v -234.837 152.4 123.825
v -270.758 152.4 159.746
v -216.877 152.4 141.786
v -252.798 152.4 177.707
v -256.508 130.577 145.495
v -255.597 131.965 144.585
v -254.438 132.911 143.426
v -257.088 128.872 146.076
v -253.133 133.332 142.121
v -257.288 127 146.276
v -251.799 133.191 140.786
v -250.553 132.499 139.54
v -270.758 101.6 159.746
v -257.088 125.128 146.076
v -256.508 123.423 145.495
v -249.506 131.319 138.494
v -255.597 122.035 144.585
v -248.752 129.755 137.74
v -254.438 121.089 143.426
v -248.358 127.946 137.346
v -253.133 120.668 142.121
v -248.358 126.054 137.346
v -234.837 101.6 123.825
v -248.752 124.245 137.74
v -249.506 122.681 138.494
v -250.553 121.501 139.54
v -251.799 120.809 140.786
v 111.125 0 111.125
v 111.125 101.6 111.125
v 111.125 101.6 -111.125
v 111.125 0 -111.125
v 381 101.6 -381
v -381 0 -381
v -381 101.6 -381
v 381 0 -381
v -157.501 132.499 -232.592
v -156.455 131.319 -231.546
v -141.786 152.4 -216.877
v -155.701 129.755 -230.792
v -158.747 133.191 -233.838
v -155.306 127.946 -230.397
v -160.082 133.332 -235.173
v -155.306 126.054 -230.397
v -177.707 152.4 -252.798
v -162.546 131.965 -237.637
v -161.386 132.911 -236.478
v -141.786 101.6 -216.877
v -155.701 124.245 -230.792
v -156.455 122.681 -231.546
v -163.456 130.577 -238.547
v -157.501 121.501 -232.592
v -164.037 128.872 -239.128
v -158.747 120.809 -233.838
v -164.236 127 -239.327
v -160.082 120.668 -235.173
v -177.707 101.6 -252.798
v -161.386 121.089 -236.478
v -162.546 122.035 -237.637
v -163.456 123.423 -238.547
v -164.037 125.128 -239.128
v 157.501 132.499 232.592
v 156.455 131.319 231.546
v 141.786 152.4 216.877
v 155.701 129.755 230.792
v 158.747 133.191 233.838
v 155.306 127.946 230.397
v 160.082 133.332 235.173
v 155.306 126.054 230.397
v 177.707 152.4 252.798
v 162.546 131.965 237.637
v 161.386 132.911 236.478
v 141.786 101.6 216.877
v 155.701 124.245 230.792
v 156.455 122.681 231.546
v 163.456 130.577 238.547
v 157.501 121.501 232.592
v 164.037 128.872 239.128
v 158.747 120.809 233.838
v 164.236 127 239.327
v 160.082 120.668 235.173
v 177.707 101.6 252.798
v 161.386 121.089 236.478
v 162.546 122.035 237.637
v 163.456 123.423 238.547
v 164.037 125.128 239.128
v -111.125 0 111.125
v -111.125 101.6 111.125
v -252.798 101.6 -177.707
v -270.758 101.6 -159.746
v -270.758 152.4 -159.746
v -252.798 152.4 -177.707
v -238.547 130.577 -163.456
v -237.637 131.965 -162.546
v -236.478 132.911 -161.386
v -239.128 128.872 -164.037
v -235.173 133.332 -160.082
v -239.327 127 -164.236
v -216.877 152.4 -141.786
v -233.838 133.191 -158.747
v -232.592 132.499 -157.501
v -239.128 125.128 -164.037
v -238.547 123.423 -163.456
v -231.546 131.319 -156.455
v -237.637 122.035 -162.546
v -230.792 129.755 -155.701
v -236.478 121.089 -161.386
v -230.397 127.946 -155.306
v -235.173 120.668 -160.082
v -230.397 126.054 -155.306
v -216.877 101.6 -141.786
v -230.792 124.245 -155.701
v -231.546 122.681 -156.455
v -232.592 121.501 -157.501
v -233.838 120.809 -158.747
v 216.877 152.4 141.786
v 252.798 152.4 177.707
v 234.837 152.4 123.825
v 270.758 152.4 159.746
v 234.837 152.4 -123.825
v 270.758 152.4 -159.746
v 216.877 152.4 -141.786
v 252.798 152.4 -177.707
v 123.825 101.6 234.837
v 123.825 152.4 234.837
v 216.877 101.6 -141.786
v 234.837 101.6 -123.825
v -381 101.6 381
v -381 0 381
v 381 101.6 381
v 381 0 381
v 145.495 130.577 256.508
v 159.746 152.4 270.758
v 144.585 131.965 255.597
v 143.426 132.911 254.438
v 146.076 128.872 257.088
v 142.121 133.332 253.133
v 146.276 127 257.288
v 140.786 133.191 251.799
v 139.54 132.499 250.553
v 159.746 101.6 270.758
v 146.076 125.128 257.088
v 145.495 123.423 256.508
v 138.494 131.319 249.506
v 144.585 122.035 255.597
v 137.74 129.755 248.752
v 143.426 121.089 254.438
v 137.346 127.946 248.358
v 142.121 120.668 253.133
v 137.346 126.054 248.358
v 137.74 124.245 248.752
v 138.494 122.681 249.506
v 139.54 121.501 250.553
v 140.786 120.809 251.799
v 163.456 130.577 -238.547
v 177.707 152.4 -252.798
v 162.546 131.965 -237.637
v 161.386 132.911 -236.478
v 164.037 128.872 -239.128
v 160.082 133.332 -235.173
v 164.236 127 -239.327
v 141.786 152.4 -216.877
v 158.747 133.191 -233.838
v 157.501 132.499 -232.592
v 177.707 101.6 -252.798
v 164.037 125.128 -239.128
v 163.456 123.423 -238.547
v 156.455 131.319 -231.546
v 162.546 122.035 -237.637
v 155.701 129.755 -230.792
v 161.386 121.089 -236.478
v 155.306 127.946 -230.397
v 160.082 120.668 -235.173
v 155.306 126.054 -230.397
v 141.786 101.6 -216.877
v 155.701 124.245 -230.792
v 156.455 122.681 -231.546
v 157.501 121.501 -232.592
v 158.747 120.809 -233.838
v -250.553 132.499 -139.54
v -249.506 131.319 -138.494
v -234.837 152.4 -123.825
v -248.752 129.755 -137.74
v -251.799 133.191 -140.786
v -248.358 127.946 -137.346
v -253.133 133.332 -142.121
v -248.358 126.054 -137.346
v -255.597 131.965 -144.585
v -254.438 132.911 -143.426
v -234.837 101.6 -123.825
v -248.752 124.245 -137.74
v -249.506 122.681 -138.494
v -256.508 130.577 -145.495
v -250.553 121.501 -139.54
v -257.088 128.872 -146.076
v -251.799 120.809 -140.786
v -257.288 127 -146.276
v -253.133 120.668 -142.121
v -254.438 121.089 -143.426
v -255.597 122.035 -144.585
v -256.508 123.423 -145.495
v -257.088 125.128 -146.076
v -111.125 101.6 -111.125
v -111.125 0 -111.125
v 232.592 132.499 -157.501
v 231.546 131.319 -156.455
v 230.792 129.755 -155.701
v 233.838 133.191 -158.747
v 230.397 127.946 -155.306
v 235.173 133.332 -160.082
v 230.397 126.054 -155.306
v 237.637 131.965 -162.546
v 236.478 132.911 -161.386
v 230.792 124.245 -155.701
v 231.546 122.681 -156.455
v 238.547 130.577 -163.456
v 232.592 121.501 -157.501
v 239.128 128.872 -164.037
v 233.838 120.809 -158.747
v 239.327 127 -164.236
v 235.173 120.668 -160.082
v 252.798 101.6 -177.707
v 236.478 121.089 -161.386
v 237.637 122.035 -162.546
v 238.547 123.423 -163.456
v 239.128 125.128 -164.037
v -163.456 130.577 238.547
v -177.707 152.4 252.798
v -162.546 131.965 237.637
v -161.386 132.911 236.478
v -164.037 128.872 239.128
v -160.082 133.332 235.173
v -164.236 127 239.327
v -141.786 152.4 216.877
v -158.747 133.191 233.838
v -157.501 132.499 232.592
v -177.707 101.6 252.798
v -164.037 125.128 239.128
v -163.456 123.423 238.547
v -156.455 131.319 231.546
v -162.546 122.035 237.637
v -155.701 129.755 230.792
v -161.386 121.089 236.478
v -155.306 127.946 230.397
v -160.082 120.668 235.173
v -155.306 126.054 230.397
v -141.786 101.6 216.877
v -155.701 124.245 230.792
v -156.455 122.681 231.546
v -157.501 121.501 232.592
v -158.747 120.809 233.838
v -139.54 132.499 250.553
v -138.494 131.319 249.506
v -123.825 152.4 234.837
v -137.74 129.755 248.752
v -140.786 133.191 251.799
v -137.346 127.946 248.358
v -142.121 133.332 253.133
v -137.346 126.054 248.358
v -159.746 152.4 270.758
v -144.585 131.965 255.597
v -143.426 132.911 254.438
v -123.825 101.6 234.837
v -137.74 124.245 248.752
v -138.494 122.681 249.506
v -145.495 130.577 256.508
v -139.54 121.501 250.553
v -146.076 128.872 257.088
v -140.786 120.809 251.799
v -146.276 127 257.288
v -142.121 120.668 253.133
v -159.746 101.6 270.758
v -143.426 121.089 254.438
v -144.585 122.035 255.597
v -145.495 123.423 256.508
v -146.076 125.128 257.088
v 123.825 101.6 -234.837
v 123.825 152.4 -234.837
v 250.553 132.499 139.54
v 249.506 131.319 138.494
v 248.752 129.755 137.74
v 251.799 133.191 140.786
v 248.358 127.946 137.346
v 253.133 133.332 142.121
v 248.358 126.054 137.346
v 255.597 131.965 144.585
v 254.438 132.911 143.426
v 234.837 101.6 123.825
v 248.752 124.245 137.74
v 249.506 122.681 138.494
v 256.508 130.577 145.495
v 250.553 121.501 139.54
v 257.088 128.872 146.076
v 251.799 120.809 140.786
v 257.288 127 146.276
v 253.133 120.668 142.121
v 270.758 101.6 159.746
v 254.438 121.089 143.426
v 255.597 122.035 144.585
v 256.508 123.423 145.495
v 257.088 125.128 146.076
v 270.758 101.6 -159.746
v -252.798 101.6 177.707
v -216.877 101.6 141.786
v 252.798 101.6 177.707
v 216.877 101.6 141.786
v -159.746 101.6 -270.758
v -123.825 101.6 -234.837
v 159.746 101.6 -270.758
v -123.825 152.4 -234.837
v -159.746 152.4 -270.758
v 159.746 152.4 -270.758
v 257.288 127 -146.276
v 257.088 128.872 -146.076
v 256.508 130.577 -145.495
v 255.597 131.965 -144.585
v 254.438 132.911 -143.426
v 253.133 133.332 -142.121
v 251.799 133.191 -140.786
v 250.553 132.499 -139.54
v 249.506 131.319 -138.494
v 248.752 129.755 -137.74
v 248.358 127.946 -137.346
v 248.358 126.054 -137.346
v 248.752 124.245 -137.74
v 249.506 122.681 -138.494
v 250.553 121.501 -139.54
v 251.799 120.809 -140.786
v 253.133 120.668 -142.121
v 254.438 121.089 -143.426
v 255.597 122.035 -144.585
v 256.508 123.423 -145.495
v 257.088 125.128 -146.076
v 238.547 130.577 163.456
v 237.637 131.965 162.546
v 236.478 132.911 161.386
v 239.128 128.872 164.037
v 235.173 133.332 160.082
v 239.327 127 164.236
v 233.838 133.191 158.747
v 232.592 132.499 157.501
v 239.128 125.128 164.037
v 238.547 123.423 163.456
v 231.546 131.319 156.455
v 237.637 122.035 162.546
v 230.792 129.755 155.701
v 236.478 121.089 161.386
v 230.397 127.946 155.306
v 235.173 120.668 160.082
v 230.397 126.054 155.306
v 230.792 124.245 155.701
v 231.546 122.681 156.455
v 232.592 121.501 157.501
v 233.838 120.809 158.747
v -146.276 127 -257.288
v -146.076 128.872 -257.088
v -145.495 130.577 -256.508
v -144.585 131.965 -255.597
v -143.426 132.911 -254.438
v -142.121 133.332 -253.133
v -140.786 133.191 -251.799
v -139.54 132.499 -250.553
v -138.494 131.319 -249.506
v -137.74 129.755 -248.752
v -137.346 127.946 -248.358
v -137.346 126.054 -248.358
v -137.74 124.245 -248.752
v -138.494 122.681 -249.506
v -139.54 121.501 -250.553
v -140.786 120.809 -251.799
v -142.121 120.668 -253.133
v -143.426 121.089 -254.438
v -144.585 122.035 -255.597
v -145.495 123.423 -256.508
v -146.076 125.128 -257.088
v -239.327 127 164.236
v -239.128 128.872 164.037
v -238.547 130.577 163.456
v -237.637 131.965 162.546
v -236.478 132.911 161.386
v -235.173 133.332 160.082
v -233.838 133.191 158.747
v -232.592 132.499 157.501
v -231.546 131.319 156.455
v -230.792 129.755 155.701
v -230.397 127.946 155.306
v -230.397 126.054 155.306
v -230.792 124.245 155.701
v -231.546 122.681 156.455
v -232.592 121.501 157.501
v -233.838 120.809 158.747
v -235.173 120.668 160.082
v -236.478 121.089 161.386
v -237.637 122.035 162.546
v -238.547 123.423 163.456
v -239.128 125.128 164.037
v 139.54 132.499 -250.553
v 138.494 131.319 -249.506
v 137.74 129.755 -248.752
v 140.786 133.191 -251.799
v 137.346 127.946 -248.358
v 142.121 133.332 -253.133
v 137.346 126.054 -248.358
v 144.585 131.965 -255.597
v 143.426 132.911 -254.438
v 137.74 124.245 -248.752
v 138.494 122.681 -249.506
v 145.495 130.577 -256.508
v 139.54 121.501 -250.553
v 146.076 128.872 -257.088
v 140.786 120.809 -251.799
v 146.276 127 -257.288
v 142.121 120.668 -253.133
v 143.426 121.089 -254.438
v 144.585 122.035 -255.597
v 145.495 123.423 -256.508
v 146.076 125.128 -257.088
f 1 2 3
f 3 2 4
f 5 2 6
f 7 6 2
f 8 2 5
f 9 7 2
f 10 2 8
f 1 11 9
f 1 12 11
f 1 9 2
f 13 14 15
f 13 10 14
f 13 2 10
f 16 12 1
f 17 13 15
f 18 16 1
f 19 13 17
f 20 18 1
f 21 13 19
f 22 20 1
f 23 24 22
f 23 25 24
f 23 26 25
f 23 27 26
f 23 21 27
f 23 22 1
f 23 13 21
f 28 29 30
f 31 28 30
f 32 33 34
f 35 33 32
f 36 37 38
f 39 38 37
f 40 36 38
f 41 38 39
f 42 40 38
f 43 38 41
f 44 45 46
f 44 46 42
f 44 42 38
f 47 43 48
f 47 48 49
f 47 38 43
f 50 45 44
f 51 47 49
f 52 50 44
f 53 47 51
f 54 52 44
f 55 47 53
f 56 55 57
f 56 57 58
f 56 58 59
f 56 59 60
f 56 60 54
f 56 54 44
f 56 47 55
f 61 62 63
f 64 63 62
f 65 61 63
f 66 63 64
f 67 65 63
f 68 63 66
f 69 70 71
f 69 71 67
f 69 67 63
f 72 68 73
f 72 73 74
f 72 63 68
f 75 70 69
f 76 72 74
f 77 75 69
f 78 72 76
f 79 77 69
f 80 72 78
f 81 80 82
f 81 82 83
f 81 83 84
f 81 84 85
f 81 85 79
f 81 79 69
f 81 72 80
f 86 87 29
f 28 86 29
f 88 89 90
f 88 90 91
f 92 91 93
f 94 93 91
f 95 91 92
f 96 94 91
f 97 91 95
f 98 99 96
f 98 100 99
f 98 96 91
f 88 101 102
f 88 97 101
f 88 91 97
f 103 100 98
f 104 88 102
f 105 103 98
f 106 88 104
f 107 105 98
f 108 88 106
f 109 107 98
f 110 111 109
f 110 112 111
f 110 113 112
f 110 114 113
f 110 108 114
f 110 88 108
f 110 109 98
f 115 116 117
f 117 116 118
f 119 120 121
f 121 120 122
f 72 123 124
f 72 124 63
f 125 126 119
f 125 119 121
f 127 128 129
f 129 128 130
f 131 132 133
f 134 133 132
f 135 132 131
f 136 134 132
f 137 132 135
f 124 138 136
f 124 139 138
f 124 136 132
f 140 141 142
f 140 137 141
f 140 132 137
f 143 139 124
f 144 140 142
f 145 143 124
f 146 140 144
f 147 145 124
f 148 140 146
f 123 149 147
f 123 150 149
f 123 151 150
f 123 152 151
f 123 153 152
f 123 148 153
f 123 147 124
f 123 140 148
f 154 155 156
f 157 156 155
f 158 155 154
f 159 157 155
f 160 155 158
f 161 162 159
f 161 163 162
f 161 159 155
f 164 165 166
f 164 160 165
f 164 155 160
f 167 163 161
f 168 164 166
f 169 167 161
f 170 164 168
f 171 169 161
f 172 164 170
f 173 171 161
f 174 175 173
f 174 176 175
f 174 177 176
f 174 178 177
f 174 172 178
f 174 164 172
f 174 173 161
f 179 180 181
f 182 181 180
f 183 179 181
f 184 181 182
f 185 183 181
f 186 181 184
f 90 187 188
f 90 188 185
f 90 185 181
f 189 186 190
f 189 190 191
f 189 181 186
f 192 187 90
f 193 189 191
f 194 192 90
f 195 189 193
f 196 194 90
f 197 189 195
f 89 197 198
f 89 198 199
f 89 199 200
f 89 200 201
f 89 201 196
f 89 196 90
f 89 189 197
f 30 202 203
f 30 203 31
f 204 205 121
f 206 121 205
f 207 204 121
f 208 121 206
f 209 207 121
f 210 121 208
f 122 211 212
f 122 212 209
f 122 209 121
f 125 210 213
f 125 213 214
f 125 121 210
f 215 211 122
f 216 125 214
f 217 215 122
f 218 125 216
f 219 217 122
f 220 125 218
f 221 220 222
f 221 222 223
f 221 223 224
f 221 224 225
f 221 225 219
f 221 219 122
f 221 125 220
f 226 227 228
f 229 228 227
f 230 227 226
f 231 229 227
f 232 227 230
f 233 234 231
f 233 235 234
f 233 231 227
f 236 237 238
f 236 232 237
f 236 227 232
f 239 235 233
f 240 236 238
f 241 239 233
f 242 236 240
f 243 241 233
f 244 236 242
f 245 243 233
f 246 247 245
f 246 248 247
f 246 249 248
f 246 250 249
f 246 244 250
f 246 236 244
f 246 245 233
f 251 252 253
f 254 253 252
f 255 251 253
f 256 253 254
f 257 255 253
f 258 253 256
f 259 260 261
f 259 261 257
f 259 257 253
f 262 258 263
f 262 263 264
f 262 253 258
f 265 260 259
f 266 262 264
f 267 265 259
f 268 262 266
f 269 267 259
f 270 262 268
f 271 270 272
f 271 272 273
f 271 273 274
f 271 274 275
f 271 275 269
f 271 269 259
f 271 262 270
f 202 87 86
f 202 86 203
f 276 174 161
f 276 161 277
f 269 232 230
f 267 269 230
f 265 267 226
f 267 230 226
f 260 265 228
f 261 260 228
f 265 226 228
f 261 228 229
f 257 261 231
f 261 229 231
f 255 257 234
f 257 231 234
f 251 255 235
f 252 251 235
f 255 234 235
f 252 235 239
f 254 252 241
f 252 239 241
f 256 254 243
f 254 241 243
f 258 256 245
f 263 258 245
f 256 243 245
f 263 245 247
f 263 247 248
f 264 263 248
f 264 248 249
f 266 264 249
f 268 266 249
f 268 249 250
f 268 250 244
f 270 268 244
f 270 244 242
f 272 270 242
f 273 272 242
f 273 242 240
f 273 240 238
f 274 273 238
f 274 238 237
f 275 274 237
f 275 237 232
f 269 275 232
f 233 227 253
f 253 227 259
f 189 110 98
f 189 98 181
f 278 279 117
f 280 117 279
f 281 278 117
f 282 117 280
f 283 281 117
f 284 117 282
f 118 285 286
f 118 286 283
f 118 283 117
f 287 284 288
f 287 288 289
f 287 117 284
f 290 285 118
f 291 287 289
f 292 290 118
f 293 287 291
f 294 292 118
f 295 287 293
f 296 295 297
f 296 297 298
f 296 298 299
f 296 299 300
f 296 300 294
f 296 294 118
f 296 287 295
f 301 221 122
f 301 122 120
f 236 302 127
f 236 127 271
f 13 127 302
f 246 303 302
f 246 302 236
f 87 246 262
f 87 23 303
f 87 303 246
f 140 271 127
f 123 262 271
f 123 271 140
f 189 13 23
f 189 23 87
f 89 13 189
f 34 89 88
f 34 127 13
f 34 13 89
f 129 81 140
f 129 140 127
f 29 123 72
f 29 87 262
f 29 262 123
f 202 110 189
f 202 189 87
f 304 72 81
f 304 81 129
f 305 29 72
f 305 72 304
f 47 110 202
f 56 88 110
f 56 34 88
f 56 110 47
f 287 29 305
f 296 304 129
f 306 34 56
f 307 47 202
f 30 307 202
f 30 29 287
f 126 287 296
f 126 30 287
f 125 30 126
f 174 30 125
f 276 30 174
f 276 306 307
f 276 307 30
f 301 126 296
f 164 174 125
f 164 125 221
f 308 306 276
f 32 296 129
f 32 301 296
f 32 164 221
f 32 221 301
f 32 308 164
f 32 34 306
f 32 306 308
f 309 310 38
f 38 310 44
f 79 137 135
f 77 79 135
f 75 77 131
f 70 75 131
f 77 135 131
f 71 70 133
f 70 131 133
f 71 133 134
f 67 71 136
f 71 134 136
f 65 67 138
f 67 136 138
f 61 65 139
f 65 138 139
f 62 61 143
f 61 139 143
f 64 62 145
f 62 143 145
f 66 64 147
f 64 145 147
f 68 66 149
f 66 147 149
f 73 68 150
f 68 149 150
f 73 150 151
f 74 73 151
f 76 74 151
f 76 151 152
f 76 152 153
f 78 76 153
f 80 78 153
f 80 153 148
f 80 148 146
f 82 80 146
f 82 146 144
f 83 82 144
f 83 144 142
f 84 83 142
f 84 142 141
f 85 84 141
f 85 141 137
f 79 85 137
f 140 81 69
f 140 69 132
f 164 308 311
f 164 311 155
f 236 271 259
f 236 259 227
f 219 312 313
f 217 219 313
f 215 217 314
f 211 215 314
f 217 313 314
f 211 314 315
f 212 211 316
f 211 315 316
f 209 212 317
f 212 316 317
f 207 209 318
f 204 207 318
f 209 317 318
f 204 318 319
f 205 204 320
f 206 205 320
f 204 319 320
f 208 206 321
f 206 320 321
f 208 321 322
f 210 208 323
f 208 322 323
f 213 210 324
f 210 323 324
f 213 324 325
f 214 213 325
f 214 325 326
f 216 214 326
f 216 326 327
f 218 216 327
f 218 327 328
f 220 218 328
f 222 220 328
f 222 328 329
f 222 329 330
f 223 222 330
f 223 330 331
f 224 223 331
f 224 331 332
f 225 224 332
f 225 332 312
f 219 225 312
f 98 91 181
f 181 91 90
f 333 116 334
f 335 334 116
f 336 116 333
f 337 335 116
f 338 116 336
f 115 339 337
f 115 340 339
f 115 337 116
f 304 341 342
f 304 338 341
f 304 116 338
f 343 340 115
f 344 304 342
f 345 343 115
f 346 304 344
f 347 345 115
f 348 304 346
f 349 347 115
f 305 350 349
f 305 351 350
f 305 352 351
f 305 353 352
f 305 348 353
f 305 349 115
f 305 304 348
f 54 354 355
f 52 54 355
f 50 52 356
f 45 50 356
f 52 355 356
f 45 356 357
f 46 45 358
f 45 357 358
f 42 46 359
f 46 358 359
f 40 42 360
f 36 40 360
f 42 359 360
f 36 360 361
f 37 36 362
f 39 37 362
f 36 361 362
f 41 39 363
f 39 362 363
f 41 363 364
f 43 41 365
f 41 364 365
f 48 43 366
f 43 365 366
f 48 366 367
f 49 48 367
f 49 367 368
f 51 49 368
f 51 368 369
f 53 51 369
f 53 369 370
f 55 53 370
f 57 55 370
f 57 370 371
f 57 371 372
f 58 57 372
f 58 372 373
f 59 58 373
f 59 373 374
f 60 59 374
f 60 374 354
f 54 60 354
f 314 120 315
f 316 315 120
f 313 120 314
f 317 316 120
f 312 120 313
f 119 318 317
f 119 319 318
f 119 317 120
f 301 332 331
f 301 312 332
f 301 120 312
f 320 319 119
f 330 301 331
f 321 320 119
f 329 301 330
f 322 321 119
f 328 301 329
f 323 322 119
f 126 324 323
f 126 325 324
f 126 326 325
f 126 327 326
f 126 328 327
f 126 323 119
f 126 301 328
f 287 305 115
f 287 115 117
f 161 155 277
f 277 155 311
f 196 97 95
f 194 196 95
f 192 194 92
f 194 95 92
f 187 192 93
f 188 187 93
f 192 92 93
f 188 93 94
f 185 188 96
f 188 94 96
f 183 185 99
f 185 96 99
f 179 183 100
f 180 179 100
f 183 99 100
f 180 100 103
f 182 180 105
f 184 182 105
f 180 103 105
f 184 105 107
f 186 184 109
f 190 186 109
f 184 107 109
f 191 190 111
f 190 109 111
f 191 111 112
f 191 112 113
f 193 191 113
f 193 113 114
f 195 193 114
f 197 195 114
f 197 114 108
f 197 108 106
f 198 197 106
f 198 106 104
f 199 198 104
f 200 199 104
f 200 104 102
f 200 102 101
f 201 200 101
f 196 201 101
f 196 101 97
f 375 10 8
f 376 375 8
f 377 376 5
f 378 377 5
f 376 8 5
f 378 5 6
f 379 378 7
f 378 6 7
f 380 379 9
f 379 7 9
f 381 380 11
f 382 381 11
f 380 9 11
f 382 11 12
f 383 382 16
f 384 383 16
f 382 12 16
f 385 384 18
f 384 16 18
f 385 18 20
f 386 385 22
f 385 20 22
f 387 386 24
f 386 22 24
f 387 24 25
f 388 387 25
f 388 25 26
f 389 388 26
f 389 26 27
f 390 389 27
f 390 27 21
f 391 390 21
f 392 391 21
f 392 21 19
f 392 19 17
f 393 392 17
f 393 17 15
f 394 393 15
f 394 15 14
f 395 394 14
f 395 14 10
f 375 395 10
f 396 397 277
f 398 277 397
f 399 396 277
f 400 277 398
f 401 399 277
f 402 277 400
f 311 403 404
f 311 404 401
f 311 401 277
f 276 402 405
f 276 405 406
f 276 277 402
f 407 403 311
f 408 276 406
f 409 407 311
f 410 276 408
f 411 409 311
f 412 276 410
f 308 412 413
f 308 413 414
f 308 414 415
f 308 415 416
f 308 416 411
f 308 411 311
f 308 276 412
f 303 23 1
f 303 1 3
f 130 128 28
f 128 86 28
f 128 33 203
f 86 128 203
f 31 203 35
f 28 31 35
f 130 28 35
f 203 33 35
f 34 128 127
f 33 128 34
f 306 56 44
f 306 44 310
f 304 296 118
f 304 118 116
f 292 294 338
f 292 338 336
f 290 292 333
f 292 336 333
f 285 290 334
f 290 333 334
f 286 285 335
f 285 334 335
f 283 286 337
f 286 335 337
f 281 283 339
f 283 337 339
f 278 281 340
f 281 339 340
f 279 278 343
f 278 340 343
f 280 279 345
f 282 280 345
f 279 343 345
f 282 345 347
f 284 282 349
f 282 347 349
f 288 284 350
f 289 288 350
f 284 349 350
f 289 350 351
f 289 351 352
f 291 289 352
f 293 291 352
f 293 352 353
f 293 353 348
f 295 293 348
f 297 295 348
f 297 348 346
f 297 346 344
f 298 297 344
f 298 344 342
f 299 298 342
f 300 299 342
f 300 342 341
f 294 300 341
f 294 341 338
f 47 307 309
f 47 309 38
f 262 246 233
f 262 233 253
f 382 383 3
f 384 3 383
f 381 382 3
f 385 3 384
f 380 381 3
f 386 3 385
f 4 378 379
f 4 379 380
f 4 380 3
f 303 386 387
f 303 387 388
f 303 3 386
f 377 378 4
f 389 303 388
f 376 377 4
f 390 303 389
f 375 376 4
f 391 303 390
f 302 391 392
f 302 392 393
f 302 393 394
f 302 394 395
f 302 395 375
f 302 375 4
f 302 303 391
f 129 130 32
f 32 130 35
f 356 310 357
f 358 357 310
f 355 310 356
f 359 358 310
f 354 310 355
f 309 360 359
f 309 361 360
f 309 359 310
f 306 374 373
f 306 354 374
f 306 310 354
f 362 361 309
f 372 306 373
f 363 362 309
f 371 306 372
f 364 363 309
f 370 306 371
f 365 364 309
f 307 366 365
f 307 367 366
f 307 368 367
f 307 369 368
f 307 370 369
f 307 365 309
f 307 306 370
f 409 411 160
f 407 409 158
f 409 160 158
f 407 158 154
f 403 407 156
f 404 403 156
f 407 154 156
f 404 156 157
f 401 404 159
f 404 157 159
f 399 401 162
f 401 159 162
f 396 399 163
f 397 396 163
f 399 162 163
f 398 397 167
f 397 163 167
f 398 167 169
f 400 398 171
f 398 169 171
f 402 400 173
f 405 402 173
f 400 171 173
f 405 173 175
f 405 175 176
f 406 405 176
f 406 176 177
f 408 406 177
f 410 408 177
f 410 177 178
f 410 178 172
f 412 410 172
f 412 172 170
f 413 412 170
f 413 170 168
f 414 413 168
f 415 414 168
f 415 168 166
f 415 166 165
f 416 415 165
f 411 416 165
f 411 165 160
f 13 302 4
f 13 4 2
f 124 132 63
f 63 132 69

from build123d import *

# Parameters (mm, degrees)
SKETCH1_W           = 762
SKETCH1_H           = 762
BOSS_EXTRUDE1_DEPTH = 101.6
SKETCH3_W           = 222.25
SKETCH3_H           = 222.25
CUT_EXTRUDE1_DEPTH  = 549.310641881
BOSS_EXTRUDE2_DEPTH = 50.8
SKETCH5_R           = 6.35
CUT_EXTRUDE2_DEPTH  = 636.846628616
CIRPATTERN1_COUNT   = 4


with BuildPart() as part:
    # Sketch1 → Boss-Extrude1 (new body)
    with BuildSketch(Plane(origin=(0, 0, 0), x_dir=(1, 0, 0), z_dir=(0, 1, 0))):
        Rectangle(SKETCH1_W, SKETCH1_H)
    extrude(amount=BOSS_EXTRUDE1_DEPTH)

    # Sketch3 → Cut-Extrude1 (cut, through all)
    with BuildSketch(Plane(origin=(0, 101.6, 0), x_dir=(1, 0, 0), z_dir=(0, 1, 0))):
        Rectangle(SKETCH3_W, SKETCH3_H)
    extrude(amount=-CUT_EXTRUDE1_DEPTH, mode=Mode.SUBTRACT)

    # Sketch4 → Boss-Extrude2 (add)
    with BuildSketch(Plane(origin=(0, 101.6, 0), x_dir=(1, 0, 0), z_dir=(0, 1, 0))):
        Polygon((141.785512242, 216.876715762), (123.825, 234.837228004), (159.746024484, 270.758252488), (177.706536726, 252.797740246), align=None)
        Polygon((216.876715762, 141.785512242), (252.797740246, 177.706536726), (270.758252488, 159.746024484), (234.837228004, 123.825), align=None)
    boss_extrude2 = extrude(amount=BOSS_EXTRUDE2_DEPTH)

    # Sketch5 → Cut-Extrude2 (cut, through all)
    with BuildSketch(Plane(origin=(55.506114002, 0, 55.506114002), x_dir=(0.7071067811865475, 0, -0.7071067811865477), z_dir=(0.7071067811865477, 0, 0.7071067811865475))):
        with Locations((279.012493577, 127)):
            Circle(SKETCH5_R)
    cut_extrude2 = extrude(amount=-CUT_EXTRUDE2_DEPTH, mode=Mode.SUBTRACT)

    # CirPattern1: Boss-Extrude2, Cut-Extrude2 ×4 about axis
    cirpattern1_axis = Axis((0, 160.02, 0), (0, -1, 0))
    add([boss_extrude2.rotate(cirpattern1_axis, i * 360 / CIRPATTERN1_COUNT) for i in range(1, CIRPATTERN1_COUNT)])
    add([cut_extrude2.rotate(cirpattern1_axis, i * 360 / CIRPATTERN1_COUNT) for i in range(1, CIRPATTERN1_COUNT)], mode=Mode.SUBTRACT)


solid = part.part
